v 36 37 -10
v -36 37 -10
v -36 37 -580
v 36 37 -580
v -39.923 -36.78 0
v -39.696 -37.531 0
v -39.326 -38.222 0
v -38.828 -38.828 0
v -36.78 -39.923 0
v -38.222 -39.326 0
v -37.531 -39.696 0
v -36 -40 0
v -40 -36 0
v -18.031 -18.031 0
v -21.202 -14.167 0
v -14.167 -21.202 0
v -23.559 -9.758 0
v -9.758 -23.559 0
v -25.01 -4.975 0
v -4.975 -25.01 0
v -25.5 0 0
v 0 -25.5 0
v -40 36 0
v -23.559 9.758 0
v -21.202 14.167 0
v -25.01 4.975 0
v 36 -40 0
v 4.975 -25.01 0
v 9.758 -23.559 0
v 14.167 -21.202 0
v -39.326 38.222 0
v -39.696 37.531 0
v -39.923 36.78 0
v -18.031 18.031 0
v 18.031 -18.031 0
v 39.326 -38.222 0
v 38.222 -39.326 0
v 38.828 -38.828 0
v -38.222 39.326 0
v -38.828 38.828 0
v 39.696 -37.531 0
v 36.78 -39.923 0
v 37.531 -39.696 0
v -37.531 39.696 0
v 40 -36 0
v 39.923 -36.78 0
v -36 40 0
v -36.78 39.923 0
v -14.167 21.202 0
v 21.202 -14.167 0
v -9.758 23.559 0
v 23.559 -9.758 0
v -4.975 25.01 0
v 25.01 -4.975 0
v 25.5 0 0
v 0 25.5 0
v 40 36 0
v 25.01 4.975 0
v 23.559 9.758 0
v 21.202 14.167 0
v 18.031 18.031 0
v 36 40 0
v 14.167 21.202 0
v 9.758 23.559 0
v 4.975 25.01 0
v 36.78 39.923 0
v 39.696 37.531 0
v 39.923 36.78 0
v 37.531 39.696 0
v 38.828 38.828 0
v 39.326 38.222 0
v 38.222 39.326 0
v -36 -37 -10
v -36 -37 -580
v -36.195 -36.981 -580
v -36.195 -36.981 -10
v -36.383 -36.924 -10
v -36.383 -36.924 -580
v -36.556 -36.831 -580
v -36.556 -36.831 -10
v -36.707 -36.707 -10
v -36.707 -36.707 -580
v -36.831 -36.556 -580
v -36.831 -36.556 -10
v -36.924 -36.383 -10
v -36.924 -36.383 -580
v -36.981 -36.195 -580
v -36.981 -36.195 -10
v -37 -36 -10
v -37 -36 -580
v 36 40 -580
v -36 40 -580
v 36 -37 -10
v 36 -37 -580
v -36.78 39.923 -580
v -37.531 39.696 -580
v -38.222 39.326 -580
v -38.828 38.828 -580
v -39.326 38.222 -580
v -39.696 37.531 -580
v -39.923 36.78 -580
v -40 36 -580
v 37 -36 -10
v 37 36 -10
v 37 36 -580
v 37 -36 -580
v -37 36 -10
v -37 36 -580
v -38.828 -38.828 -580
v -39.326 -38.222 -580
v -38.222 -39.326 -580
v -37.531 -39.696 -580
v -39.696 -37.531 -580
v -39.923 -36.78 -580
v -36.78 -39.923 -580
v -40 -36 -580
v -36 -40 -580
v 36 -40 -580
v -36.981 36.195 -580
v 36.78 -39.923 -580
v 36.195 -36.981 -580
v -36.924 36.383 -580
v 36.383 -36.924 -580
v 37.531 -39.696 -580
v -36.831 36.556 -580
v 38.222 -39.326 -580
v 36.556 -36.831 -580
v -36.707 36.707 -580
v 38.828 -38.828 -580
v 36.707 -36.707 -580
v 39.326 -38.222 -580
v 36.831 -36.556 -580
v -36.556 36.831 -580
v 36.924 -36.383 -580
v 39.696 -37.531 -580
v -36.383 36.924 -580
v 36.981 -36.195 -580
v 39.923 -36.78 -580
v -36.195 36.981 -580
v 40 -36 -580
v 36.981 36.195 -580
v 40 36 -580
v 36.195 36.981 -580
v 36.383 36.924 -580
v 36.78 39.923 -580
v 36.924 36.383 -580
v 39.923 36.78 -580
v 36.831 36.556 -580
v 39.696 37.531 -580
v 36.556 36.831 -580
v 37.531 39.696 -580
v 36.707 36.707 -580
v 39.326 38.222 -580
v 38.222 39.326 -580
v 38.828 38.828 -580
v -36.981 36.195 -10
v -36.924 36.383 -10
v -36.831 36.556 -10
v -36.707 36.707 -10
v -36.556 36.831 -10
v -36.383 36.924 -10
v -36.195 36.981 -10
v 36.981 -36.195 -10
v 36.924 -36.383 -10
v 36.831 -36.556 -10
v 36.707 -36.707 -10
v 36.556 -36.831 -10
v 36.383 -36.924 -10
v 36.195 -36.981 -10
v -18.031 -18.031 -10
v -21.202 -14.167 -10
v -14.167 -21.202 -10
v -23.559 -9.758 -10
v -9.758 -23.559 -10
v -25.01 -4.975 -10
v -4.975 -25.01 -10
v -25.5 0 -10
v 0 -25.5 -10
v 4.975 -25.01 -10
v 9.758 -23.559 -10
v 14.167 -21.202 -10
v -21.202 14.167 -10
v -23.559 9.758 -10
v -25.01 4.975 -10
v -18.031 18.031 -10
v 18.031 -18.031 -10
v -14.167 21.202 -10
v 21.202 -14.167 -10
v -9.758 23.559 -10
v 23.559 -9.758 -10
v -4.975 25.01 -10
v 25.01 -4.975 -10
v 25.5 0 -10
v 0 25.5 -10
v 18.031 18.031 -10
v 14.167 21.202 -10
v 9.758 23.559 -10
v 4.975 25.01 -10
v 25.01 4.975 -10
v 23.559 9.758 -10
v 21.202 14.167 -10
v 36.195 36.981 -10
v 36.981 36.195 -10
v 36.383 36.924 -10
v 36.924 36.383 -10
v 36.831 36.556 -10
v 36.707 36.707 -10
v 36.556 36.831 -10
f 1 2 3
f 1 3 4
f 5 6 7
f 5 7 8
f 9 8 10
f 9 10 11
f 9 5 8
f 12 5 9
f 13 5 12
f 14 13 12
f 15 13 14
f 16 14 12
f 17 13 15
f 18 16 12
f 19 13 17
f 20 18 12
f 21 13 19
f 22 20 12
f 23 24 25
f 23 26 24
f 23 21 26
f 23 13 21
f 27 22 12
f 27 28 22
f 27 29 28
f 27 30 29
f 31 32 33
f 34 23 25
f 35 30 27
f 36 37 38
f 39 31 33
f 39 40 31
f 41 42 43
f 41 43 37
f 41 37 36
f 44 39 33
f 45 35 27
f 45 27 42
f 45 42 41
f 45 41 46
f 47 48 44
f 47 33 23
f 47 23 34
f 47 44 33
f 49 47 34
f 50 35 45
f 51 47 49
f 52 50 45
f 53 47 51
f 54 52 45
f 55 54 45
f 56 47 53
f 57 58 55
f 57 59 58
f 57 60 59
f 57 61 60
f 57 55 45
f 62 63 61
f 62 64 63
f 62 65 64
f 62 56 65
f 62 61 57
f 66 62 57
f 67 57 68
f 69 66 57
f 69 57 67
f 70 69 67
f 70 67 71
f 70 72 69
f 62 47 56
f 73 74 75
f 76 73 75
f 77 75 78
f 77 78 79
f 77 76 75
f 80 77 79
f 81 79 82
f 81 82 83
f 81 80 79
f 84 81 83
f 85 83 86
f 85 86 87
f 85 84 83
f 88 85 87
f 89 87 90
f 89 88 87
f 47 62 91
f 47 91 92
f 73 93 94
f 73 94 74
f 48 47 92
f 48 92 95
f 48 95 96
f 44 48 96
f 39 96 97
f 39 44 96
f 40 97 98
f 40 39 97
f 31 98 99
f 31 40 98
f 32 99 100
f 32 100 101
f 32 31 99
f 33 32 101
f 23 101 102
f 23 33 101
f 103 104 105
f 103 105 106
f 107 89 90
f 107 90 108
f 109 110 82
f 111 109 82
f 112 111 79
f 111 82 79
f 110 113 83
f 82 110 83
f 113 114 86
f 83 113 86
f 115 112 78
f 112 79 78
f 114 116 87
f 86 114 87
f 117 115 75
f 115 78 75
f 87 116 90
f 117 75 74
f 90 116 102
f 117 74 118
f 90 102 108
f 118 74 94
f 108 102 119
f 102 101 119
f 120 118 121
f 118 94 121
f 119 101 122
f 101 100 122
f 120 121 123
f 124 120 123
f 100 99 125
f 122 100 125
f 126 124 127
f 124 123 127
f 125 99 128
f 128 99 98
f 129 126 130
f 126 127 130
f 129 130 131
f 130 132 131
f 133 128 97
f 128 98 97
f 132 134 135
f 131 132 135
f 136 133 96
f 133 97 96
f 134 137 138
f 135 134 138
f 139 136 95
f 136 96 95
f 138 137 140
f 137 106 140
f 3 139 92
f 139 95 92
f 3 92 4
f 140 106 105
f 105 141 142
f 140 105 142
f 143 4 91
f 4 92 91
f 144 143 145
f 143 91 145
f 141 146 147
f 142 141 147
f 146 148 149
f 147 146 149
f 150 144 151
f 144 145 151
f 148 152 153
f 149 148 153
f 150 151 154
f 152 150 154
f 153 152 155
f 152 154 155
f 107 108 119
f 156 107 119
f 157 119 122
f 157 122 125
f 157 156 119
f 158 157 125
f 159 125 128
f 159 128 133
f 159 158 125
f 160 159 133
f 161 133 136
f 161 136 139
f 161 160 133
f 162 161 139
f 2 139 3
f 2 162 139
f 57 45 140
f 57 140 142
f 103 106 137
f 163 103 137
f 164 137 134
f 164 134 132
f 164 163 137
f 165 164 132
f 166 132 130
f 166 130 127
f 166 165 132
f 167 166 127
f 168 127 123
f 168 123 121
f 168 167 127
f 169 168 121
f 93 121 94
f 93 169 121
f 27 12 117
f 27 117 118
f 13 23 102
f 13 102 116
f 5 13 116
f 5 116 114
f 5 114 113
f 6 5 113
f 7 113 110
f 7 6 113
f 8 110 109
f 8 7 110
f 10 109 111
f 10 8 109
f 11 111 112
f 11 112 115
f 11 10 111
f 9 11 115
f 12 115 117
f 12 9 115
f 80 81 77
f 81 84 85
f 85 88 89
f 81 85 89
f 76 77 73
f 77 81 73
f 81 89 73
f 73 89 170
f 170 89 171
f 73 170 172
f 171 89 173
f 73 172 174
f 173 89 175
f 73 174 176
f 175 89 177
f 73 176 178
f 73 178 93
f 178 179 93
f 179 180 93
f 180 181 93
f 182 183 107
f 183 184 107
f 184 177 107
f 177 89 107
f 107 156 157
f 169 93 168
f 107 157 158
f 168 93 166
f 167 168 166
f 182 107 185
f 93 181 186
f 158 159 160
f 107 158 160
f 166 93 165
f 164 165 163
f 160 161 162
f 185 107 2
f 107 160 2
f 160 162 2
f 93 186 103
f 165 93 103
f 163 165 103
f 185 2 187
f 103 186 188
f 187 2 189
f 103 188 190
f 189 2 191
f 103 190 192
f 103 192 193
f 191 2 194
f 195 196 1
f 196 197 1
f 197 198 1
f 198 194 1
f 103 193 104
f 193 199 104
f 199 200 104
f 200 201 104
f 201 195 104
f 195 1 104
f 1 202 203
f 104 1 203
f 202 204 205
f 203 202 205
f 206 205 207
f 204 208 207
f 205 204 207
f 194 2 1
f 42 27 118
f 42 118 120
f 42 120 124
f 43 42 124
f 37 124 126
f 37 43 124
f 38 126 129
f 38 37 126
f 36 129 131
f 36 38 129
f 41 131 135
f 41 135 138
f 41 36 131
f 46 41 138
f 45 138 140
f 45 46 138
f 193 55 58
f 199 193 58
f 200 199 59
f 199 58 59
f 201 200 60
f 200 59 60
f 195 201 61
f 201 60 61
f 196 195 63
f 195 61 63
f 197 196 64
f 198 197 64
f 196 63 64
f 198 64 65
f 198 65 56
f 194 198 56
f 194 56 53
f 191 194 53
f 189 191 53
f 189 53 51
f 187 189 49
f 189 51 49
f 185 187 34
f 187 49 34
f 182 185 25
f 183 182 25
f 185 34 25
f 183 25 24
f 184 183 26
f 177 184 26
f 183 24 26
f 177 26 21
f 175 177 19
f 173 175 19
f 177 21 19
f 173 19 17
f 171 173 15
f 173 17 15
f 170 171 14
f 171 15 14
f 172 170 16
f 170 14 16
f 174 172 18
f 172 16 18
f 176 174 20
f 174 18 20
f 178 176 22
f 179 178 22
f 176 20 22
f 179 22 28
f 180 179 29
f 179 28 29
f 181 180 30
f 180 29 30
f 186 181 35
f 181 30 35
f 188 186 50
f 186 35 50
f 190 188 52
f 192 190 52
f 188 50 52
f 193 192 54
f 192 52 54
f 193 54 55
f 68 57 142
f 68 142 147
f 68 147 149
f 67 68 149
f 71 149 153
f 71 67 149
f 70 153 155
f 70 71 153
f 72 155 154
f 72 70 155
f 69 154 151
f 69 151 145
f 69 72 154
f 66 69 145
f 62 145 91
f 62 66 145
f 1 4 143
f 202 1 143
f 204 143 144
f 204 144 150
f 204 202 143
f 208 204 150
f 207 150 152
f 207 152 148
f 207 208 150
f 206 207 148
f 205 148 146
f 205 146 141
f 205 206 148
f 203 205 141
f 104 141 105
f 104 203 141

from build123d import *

# Parameters (mm, degrees)
F1_DEPTH = 580
F0_R     = 25.5
F2_DEPTH = 10


with BuildPart() as f1:
    # F0 (on Top) → F1 (new body)
    with BuildSketch(Plane.XY):
        with BuildLine():
            ThreePointArc((40, 36), (38.828427, 38.828427), (36, 40))
            Line((36, 40), (-36, 40))
            ThreePointArc((-36, 40), (-38.828427, 38.828427), (-40, 36))
            Line((-40, 36), (-40, -36))
            ThreePointArc((-40, -36), (-38.828427, -38.828427), (-36, -40))
            Line((-36, -40), (36, -40))
            ThreePointArc((36, -40), (38.828427, -38.828427), (40, -36))
            Line((40, -36), (40, 36))
        make_face()
        with BuildLine():
            ThreePointArc((-37, 36), (-36.707107, 36.707107), (-36, 37))
            Line((-36, 37), (36, 37))
            ThreePointArc((36, 37), (36.707107, 36.707107), (37, 36))
            Line((37, 36), (37, -36))
            ThreePointArc((37, -36), (36.707107, -36.707107), (36, -37))
            Line((36, -37), (-36, -37))
            ThreePointArc((-36, -37), (-36.707107, -36.707107), (-37, -36))
            Line((-37, -36), (-37, 36))
        make_face(mode=Mode.SUBTRACT)
    extrude(amount=-F1_DEPTH)

    # F0 (on Top) → F2 (join)
    with BuildSketch(Plane.XY):
        with BuildLine():
            Line((36, 37), (-36, 37))
            ThreePointArc((-36, 37), (-36.707107, 36.707107), (-37, 36))
            Line((-37, 36), (-37, -36))
            ThreePointArc((-37, -36), (-36.707107, -36.707107), (-36, -37))
            Line((-36, -37), (36, -37))
            ThreePointArc((36, -37), (36.707107, -36.707107), (37, -36))
            Line((37, -36), (37, 36))
            ThreePointArc((37, 36), (36.707107, 36.707107), (36, 37))
        make_face()
        Circle(F0_R, mode=Mode.SUBTRACT)
    extrude(amount=-F2_DEPTH)


solid = f1.part
